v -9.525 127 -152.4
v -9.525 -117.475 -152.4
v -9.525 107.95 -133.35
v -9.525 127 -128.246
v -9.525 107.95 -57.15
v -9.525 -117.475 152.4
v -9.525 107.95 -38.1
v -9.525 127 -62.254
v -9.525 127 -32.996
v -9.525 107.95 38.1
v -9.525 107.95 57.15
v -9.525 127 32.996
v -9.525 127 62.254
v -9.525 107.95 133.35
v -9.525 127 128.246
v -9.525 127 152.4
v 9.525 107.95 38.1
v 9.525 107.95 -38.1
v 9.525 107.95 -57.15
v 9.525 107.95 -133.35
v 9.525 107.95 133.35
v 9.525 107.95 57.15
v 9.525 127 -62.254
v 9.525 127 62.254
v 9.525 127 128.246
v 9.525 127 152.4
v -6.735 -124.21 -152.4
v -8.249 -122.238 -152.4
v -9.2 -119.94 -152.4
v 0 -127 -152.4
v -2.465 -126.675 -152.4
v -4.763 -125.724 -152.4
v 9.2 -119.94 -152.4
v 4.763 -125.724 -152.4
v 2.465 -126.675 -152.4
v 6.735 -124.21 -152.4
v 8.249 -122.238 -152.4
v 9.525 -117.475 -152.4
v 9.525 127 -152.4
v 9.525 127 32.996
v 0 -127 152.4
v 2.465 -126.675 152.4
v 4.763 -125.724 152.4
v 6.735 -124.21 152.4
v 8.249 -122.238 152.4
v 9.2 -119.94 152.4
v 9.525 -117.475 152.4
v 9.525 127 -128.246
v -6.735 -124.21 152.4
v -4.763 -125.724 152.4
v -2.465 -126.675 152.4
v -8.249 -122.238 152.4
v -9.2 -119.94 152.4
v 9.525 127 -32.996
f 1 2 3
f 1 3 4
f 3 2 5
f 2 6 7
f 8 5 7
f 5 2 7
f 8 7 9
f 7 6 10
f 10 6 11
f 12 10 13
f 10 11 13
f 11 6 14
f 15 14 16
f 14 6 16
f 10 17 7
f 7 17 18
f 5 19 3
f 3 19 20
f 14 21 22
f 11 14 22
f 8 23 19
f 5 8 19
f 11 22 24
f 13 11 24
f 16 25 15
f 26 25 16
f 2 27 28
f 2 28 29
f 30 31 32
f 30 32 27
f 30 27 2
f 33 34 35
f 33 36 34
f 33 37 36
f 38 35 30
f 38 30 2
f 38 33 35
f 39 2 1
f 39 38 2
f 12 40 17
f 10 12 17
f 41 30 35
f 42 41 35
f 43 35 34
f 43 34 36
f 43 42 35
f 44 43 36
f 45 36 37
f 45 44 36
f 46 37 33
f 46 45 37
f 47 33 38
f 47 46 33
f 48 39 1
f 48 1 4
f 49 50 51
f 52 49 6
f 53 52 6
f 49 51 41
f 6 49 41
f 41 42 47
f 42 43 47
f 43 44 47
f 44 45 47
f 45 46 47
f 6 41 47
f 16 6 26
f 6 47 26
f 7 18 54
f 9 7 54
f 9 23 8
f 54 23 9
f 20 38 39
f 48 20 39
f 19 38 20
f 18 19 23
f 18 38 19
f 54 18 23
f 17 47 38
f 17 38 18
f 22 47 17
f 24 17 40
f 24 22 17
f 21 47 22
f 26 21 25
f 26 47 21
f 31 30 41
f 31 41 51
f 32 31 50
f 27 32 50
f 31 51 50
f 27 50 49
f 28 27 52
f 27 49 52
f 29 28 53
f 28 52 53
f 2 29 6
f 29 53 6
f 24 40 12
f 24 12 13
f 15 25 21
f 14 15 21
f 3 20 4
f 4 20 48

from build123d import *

# Parameters (mm, degrees)
F0_W     = 254
F0_H     = 304.8
F1_DEPTH = 9.525
F2_R     = 9.52499
F4_DEPTH = 19.051


# Not quite as in the source:
# - a fillet or chamfer is up to 0.001 mm smaller than in the source, because OpenCascade refuses the exact size
# - a feature names something its author has since deleted; it is built from what else it names


with BuildPart() as f1:
    # F0 (on Right) → F1 (new body, symmetric)
    with BuildSketch(Plane.YZ):
        Rectangle(F0_W, F0_H)
    extrude(amount=F1_DEPTH, both=True)

    # F2 (radius 9.525 in the source; OpenCascade refuses exactly that, so slightly less here)
    f2_edges = [f1.edges().sort_by_distance(p)[0] for p in [
        (9.525, -127, 0),
        (-9.525, -127, 0),
    ]]
    fillet(f2_edges, radius=F2_R)

    # F3 (on face) → F4 (cut, through all)
    with BuildSketch(Plane.YZ.offset(9.525)):
        Polygon((107.95, 57.15), (127, 62.2544321158), (127, 128.2455678842), (107.95, 133.35), align=None)
        Polygon((127, -32.9955678842), (127, 32.9955678842), (107.95, 38.1), (107.95, -38.1), align=None)
        Polygon((127, -128.2455678842), (127, -62.2544321158), (107.95, -57.15), (107.95, -133.35), align=None)
    extrude(amount=-F4_DEPTH, mode=Mode.SUBTRACT)


solid = f1.part
